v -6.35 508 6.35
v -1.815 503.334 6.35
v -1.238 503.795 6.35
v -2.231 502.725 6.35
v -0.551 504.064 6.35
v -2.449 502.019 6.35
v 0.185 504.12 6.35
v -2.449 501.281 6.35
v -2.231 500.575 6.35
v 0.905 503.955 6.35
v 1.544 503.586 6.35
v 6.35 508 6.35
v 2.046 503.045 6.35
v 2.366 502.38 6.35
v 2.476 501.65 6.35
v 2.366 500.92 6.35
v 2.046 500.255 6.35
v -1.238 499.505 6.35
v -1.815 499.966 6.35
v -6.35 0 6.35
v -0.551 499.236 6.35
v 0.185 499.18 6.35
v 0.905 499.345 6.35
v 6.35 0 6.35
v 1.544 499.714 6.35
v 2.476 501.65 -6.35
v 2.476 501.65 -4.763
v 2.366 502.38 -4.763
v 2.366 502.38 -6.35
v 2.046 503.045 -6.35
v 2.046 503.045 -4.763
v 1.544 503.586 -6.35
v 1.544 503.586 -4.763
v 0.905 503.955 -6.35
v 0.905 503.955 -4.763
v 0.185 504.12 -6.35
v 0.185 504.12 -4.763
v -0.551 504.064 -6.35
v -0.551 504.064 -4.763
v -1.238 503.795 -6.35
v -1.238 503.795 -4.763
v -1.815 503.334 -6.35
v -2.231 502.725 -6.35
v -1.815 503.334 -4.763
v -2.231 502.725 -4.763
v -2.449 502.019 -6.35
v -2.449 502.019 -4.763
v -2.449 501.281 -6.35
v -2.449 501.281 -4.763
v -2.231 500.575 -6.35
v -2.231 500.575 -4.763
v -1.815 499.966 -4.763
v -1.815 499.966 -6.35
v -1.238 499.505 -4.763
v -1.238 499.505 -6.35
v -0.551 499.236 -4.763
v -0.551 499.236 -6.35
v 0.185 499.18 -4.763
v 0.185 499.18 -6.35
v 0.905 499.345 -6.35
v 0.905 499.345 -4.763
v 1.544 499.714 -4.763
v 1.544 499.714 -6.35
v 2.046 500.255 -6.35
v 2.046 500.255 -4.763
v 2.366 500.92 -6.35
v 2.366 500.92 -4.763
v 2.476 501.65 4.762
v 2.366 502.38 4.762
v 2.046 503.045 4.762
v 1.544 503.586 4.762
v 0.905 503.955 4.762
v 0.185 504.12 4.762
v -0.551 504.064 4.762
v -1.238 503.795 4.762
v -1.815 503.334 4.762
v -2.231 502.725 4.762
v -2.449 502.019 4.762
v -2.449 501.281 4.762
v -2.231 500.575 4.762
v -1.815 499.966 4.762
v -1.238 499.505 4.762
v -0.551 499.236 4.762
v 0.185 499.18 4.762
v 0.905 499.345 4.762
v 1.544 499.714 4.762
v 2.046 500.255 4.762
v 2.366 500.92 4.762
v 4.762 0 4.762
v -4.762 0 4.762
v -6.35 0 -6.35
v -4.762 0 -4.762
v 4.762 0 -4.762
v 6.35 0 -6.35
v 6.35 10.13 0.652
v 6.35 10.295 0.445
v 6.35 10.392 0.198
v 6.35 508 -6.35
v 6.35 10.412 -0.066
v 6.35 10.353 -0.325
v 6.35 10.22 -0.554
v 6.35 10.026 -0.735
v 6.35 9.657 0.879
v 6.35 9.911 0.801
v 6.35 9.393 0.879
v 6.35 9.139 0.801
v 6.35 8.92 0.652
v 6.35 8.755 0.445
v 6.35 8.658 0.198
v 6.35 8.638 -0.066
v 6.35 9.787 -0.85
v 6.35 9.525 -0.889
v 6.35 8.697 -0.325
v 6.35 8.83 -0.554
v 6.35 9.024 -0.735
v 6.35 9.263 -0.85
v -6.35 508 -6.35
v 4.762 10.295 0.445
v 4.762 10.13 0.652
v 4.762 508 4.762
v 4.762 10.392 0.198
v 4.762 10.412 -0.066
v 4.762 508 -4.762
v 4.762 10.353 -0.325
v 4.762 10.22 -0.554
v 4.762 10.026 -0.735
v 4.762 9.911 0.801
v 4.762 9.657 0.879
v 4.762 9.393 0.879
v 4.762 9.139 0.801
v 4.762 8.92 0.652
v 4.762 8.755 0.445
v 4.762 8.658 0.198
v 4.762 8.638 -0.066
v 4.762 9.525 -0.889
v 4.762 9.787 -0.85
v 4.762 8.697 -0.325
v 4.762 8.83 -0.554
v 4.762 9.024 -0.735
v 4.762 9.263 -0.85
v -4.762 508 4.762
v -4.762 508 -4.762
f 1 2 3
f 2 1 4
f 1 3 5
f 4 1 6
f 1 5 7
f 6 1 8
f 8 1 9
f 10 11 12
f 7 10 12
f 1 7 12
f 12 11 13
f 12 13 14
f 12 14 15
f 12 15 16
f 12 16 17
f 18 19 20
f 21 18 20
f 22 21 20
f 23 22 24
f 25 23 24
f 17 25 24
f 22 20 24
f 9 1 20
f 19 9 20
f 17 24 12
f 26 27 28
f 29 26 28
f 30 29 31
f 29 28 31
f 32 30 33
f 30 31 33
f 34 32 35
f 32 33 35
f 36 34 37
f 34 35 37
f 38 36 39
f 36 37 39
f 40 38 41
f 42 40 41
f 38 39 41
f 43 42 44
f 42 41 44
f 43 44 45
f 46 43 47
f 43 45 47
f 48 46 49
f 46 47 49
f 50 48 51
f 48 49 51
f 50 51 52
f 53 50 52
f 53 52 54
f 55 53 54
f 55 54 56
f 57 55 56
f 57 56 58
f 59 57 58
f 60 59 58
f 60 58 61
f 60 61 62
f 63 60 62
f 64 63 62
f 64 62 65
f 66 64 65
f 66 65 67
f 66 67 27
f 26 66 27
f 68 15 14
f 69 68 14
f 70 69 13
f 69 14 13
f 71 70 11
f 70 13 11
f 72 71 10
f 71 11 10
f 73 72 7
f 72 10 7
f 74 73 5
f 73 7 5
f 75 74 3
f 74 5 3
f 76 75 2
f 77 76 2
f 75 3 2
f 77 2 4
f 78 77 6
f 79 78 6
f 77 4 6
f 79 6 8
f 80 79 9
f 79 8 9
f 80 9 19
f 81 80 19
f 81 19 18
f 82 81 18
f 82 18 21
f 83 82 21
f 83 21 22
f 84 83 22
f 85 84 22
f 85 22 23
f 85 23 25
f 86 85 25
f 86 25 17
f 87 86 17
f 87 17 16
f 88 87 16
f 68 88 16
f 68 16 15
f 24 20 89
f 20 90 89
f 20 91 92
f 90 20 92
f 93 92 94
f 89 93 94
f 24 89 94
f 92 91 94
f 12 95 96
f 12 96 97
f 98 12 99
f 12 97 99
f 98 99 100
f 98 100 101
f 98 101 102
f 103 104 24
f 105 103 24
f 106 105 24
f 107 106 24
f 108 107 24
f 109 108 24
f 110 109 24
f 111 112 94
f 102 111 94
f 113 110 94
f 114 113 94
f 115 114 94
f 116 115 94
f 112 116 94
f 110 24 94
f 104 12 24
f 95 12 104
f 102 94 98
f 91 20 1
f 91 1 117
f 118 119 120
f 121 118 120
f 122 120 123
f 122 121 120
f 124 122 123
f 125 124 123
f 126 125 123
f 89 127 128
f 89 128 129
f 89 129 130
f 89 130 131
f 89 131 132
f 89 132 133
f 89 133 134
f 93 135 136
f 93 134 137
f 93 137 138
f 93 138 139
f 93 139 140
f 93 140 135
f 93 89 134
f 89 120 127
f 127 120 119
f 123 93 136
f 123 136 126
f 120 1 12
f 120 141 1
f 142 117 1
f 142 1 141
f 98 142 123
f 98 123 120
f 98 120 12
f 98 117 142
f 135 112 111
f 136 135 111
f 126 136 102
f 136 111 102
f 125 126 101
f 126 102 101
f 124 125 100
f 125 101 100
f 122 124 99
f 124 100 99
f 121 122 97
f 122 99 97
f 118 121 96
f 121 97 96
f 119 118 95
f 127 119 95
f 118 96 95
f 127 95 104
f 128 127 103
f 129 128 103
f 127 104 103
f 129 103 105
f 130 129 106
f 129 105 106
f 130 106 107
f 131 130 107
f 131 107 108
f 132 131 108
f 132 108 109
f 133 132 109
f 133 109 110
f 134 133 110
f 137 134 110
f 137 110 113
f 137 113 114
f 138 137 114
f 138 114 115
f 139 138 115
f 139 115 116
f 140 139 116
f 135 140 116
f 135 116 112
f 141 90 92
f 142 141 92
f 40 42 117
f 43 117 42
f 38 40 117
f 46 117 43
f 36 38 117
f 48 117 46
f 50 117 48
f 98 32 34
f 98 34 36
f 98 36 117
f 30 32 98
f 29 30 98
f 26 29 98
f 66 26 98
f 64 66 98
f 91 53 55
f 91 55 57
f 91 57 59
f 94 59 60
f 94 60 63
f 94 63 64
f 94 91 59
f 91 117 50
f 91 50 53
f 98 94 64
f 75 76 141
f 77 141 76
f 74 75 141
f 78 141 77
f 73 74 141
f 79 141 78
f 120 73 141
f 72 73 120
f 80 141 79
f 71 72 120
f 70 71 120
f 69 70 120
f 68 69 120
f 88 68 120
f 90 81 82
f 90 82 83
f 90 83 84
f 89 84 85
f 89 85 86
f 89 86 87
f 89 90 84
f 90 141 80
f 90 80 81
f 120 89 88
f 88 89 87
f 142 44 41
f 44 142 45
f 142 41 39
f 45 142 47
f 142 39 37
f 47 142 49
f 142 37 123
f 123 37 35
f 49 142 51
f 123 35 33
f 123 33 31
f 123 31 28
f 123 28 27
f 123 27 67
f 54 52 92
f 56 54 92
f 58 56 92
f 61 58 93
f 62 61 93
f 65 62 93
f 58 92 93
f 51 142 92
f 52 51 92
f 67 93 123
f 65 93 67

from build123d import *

# Parameters (mm, degrees)
SKETCH1_W               = 12.7
SKETCH1_H               = 12.7
SKETCH1_W_2             = 9.525
SKETCH1_H_2             = 9.525
EXTRUDE_THIN1_DEPTH     = 508
SKETCH3_R               = 2.4765
CUT_EXTRUDE2_DEPTH      = 1
CUT_EXTRUDE2_DEPTH_BACK = 13.7
CUT_EXTRUDE3_REACH      = 14.7
SKETCH4_R               = 0.889


with BuildPart() as part:
    # Sketch1 → Extrude-Thin1 (new body)
    with BuildSketch(Plane(origin=(0, 0, 0), x_dir=(1, 0, 0), z_dir=(0, 1, 0))):
        Rectangle(SKETCH1_W, SKETCH1_H)
        Rectangle(SKETCH1_W_2, SKETCH1_H_2, mode=Mode.SUBTRACT)
    extrude(amount=EXTRUDE_THIN1_DEPTH)

    # Sketch3 → Cut-Extrude2 (cut, two sides)
    with BuildSketch(Plane.XY.offset(6.35)) as cut_extrude2_sk:
        with Locations((0, 501.65)):
            Circle(SKETCH3_R)
    extrude(amount=CUT_EXTRUDE2_DEPTH, mode=Mode.SUBTRACT)
    extrude(cut_extrude2_sk.sketch, amount=-CUT_EXTRUDE2_DEPTH_BACK, mode=Mode.SUBTRACT)

    # Sketch4 → Cut-Extrude3 (cut, up to next)
    with BuildSketch(Plane(origin=(6.35, 0, 0), x_dir=(0, 0, -1), z_dir=(1, 0, 0)), mode=Mode.PRIVATE) as cut_extrude3_sk1:
        with Locations((0, 9.525)):
            Circle(SKETCH4_R)
    cut_extrude3_tool1 = extrude(cut_extrude3_sk1.sketch, amount=-CUT_EXTRUDE3_REACH, mode=Mode.PRIVATE) & part.part
    add(cut_extrude3_tool1.solids().sort_by_distance((6.35, 9.525, 0))[0], mode=Mode.SUBTRACT)


solid = part.part
